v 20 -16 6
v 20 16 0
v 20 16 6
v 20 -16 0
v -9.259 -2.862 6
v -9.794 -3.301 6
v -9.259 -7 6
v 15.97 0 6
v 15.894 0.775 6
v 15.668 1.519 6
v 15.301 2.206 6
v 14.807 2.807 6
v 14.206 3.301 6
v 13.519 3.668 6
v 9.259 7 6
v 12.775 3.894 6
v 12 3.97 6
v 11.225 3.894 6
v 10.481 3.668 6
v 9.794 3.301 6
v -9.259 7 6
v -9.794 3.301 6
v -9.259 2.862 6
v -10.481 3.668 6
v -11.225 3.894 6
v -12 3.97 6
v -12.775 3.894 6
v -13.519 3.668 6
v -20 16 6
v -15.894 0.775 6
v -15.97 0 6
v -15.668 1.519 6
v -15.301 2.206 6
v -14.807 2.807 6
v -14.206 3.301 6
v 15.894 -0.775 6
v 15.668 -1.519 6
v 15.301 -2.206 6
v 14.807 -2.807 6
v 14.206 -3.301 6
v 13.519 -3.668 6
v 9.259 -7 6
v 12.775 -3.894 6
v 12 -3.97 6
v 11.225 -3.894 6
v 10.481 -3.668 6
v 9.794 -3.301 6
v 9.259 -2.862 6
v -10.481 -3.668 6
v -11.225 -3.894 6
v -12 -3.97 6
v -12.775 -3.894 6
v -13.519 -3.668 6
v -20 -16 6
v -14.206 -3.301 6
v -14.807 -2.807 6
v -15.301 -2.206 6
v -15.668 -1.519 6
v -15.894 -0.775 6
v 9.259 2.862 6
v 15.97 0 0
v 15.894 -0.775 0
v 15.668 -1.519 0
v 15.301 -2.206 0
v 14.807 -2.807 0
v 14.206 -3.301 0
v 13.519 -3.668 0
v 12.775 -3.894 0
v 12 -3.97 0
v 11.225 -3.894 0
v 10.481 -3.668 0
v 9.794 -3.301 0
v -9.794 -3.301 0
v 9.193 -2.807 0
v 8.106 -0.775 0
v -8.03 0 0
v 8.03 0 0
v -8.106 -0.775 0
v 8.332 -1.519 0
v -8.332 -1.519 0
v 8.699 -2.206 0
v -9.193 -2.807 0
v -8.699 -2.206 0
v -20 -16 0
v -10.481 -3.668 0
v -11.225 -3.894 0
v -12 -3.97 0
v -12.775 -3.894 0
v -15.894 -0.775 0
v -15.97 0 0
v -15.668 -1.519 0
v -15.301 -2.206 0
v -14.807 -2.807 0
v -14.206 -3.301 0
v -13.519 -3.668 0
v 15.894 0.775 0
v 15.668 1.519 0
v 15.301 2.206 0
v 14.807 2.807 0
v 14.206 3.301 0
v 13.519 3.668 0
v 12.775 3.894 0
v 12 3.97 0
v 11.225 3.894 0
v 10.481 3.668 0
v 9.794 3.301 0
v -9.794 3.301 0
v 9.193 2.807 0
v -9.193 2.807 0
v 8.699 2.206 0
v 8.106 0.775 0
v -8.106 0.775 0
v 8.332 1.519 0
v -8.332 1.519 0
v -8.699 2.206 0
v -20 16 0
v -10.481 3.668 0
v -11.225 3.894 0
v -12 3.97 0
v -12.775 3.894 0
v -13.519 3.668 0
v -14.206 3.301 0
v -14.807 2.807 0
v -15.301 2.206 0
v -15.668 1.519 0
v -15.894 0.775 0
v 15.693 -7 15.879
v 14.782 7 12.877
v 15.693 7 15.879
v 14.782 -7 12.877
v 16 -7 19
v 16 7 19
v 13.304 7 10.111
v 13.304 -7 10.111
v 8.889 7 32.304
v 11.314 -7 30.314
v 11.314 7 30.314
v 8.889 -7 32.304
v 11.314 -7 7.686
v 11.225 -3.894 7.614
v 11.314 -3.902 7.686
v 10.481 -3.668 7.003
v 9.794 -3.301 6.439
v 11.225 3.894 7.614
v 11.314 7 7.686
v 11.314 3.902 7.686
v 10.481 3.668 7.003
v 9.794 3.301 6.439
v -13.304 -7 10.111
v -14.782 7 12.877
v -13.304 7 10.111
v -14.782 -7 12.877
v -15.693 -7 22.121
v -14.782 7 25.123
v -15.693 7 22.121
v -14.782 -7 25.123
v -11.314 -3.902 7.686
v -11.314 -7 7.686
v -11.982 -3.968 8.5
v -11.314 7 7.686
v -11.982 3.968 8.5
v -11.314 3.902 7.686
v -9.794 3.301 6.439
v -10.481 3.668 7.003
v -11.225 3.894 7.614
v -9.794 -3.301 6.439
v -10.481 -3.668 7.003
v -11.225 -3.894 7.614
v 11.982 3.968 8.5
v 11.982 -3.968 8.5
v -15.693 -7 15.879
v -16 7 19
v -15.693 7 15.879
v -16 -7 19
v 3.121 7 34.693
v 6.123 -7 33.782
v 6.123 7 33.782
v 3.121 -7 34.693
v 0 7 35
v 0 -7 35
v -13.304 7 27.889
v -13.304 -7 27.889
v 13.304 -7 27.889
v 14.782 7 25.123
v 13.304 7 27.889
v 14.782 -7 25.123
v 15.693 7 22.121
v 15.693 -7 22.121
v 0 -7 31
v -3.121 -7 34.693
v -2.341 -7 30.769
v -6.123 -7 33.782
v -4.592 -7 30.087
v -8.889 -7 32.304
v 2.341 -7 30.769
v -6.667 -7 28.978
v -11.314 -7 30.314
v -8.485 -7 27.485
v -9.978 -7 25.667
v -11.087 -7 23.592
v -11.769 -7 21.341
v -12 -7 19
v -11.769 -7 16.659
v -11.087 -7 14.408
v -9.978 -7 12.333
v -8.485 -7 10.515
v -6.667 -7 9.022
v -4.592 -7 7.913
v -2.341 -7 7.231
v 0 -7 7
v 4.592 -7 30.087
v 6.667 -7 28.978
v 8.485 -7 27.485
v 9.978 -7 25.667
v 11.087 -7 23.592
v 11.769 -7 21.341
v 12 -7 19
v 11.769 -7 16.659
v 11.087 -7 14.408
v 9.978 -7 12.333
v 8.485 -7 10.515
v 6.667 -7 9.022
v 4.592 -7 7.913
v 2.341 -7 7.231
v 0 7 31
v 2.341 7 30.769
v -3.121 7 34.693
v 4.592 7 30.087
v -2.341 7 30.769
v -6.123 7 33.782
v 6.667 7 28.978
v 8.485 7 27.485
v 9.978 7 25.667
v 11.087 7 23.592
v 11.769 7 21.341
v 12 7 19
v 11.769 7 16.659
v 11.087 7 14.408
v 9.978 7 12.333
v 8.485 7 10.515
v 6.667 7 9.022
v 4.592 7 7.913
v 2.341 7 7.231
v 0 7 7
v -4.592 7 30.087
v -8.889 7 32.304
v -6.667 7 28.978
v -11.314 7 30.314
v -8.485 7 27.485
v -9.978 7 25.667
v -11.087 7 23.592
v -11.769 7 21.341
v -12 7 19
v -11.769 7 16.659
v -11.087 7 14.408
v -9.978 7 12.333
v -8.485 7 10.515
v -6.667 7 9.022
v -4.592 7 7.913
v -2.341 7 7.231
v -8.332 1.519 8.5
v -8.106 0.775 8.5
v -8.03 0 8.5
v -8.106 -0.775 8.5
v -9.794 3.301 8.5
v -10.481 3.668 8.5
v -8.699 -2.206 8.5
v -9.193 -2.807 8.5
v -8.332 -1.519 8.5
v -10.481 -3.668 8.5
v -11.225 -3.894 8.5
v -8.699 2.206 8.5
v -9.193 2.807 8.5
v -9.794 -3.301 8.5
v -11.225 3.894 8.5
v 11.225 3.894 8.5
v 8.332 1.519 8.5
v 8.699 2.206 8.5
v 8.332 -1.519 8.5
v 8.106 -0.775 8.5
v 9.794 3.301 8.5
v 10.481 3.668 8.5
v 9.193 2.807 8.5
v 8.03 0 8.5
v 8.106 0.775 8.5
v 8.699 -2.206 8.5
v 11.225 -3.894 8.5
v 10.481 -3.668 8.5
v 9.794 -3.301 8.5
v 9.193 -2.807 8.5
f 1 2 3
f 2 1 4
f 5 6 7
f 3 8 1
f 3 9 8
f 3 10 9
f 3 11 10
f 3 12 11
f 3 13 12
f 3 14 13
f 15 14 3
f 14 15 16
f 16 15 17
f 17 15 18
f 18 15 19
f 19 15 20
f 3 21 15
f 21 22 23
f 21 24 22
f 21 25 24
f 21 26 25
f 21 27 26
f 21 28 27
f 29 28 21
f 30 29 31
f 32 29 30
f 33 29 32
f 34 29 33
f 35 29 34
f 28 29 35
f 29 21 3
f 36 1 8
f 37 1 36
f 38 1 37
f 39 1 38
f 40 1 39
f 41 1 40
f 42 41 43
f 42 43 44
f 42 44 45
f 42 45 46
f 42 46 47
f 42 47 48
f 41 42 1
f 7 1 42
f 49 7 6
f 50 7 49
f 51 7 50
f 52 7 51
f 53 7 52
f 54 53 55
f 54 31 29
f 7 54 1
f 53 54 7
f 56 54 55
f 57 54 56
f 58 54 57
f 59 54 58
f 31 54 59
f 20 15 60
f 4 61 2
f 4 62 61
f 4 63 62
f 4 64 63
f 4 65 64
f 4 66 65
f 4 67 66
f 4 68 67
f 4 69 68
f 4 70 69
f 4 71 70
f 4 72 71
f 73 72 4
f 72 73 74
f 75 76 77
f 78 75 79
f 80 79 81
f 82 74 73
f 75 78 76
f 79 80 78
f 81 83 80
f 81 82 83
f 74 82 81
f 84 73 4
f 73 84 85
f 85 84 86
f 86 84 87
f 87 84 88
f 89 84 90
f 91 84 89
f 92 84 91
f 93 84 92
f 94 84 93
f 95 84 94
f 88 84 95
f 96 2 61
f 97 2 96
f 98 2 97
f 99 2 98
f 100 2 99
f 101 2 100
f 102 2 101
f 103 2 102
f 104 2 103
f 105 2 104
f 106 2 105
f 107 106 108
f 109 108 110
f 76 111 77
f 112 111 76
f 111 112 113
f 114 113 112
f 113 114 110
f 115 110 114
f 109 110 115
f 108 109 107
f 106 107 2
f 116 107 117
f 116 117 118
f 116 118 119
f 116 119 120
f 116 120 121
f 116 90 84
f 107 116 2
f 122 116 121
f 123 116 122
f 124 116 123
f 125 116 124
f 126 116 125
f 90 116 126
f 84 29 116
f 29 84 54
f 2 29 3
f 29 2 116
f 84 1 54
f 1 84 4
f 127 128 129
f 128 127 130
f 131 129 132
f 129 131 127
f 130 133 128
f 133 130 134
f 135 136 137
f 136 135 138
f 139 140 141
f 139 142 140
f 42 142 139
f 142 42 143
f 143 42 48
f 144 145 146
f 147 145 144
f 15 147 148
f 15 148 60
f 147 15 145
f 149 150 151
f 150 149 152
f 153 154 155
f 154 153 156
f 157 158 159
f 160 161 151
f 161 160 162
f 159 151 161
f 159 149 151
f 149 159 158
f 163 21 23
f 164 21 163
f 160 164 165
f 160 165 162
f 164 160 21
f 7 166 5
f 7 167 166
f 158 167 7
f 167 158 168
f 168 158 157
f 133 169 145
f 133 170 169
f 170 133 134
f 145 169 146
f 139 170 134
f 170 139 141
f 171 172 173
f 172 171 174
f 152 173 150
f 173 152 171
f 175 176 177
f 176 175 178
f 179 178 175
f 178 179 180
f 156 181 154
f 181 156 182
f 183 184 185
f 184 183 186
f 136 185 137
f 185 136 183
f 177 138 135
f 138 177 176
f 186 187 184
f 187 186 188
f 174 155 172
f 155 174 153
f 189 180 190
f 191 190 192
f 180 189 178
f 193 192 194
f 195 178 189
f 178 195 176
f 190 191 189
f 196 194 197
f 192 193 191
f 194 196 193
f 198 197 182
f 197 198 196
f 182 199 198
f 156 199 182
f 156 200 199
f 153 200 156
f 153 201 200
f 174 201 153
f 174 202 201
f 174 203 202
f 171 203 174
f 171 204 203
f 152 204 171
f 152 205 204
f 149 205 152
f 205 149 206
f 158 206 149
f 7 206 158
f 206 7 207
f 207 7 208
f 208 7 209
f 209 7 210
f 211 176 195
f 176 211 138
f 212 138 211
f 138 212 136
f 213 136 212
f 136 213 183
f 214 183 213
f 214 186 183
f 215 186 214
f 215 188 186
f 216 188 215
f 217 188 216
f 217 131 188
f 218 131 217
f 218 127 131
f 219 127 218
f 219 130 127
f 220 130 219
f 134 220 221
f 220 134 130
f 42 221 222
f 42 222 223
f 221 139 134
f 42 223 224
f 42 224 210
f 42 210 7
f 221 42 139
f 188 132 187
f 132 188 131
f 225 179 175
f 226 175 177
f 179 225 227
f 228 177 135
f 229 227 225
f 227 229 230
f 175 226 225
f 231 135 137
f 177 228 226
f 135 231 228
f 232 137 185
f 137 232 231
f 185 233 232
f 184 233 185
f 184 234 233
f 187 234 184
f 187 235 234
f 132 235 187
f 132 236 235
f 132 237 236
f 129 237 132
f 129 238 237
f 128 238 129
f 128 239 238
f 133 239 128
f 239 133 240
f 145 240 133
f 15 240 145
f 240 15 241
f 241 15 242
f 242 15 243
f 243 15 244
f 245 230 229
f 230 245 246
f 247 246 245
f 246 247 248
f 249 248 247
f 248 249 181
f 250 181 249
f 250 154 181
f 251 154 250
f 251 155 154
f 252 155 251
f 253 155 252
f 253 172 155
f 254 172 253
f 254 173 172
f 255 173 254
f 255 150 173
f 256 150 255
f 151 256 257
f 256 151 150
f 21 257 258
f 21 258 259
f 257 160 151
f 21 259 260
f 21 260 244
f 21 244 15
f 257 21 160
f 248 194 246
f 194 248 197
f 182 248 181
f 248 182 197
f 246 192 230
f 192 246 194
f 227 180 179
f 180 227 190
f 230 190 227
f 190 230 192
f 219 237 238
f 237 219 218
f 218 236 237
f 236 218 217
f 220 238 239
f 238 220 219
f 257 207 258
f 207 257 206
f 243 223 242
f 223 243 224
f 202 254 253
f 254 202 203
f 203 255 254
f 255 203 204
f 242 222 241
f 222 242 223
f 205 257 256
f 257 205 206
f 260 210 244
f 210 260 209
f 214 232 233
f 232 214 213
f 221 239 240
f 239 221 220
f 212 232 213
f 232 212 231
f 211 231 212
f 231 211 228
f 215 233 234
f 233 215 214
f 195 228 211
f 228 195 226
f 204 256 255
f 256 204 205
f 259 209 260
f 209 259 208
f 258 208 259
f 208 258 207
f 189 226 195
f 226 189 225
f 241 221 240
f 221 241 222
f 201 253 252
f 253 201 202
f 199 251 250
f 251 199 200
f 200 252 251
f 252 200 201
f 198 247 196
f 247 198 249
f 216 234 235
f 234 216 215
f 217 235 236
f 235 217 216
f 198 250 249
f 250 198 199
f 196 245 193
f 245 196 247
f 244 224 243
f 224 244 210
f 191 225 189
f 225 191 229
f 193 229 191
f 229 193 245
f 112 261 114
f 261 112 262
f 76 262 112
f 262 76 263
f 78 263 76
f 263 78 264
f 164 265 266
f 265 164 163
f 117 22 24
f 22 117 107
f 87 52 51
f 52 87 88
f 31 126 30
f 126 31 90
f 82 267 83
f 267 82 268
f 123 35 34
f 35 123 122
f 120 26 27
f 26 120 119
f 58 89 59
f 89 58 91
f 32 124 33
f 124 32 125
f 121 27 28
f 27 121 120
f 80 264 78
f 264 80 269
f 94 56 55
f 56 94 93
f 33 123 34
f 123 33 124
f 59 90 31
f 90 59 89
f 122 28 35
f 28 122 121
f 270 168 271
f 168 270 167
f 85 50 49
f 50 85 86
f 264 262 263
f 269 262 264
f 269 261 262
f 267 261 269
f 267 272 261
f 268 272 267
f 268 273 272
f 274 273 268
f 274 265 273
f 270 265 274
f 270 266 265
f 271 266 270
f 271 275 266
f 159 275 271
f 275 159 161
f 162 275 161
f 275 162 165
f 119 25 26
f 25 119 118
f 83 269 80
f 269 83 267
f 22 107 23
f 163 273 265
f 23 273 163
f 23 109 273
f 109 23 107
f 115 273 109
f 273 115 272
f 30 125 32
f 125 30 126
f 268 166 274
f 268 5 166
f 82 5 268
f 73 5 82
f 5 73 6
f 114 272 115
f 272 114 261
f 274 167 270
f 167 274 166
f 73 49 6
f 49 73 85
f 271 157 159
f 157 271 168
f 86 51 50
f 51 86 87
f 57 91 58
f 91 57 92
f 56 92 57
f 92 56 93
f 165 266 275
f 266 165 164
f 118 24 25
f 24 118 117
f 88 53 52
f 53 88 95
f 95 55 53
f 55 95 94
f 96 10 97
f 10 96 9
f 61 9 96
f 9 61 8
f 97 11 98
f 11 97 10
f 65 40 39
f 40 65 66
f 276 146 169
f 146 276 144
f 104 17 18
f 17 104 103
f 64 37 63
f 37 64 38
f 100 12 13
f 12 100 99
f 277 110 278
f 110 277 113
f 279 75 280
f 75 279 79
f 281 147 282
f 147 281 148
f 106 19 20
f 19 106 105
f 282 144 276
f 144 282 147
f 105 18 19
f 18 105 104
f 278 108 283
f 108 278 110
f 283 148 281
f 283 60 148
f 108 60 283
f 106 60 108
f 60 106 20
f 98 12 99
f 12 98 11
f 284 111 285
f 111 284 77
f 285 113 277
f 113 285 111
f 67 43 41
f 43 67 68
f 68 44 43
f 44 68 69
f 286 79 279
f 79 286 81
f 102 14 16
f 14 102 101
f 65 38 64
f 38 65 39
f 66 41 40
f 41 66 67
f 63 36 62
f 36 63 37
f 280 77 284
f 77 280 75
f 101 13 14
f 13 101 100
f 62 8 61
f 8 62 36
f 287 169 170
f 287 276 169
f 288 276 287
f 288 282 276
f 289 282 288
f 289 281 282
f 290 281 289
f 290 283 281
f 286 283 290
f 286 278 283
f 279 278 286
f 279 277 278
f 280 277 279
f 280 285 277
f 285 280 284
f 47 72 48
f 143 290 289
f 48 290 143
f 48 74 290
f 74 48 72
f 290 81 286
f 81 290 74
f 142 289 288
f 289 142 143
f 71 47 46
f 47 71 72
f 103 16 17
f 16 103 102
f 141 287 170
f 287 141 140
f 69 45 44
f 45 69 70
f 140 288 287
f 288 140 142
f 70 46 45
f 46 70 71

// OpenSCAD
$fn = 32;

// ----------------------------------------------------------------------
// Deck eye: 32 mm eye on a 40 mm base
// ----------------------------------------------------------------------

// --- parameters (mm) ---
base_l = 40;              // base length
base_w = 32;              // base width
base_t = 6;               // base thickness
eye_r = 16;               // eye outside radius
eye_bore = 24;            // eye bore diameter
eye_w = 14;               // eye thickness
eye_z = 19;               // eye centre height
holes_d = 7.94;           // fixing holes
hole_x = 12;              // fixing hole spacing

difference() {
  union() {
    translate([-20, -16, 0]) cube([base_l, base_w, base_t]);
    /* eye standing upright, its foot sunk 3 mm into the base */
    translate([0, -7, 19]) rotate([-90, 0, 0]) cylinder(h = 14, d = 32);
  }
  /* eye bore, 2.5 mm clear of both faces */
  translate([0, -9.5, 19]) rotate([-90, 0, 0]) cylinder(h = 19, d = 24);
  translate([-12, 0, -2.5]) cylinder(h = base_t + 5, d = holes_d);
  translate([12, 0, -2.5]) cylinder(h = base_t + 5, d = holes_d);
}
